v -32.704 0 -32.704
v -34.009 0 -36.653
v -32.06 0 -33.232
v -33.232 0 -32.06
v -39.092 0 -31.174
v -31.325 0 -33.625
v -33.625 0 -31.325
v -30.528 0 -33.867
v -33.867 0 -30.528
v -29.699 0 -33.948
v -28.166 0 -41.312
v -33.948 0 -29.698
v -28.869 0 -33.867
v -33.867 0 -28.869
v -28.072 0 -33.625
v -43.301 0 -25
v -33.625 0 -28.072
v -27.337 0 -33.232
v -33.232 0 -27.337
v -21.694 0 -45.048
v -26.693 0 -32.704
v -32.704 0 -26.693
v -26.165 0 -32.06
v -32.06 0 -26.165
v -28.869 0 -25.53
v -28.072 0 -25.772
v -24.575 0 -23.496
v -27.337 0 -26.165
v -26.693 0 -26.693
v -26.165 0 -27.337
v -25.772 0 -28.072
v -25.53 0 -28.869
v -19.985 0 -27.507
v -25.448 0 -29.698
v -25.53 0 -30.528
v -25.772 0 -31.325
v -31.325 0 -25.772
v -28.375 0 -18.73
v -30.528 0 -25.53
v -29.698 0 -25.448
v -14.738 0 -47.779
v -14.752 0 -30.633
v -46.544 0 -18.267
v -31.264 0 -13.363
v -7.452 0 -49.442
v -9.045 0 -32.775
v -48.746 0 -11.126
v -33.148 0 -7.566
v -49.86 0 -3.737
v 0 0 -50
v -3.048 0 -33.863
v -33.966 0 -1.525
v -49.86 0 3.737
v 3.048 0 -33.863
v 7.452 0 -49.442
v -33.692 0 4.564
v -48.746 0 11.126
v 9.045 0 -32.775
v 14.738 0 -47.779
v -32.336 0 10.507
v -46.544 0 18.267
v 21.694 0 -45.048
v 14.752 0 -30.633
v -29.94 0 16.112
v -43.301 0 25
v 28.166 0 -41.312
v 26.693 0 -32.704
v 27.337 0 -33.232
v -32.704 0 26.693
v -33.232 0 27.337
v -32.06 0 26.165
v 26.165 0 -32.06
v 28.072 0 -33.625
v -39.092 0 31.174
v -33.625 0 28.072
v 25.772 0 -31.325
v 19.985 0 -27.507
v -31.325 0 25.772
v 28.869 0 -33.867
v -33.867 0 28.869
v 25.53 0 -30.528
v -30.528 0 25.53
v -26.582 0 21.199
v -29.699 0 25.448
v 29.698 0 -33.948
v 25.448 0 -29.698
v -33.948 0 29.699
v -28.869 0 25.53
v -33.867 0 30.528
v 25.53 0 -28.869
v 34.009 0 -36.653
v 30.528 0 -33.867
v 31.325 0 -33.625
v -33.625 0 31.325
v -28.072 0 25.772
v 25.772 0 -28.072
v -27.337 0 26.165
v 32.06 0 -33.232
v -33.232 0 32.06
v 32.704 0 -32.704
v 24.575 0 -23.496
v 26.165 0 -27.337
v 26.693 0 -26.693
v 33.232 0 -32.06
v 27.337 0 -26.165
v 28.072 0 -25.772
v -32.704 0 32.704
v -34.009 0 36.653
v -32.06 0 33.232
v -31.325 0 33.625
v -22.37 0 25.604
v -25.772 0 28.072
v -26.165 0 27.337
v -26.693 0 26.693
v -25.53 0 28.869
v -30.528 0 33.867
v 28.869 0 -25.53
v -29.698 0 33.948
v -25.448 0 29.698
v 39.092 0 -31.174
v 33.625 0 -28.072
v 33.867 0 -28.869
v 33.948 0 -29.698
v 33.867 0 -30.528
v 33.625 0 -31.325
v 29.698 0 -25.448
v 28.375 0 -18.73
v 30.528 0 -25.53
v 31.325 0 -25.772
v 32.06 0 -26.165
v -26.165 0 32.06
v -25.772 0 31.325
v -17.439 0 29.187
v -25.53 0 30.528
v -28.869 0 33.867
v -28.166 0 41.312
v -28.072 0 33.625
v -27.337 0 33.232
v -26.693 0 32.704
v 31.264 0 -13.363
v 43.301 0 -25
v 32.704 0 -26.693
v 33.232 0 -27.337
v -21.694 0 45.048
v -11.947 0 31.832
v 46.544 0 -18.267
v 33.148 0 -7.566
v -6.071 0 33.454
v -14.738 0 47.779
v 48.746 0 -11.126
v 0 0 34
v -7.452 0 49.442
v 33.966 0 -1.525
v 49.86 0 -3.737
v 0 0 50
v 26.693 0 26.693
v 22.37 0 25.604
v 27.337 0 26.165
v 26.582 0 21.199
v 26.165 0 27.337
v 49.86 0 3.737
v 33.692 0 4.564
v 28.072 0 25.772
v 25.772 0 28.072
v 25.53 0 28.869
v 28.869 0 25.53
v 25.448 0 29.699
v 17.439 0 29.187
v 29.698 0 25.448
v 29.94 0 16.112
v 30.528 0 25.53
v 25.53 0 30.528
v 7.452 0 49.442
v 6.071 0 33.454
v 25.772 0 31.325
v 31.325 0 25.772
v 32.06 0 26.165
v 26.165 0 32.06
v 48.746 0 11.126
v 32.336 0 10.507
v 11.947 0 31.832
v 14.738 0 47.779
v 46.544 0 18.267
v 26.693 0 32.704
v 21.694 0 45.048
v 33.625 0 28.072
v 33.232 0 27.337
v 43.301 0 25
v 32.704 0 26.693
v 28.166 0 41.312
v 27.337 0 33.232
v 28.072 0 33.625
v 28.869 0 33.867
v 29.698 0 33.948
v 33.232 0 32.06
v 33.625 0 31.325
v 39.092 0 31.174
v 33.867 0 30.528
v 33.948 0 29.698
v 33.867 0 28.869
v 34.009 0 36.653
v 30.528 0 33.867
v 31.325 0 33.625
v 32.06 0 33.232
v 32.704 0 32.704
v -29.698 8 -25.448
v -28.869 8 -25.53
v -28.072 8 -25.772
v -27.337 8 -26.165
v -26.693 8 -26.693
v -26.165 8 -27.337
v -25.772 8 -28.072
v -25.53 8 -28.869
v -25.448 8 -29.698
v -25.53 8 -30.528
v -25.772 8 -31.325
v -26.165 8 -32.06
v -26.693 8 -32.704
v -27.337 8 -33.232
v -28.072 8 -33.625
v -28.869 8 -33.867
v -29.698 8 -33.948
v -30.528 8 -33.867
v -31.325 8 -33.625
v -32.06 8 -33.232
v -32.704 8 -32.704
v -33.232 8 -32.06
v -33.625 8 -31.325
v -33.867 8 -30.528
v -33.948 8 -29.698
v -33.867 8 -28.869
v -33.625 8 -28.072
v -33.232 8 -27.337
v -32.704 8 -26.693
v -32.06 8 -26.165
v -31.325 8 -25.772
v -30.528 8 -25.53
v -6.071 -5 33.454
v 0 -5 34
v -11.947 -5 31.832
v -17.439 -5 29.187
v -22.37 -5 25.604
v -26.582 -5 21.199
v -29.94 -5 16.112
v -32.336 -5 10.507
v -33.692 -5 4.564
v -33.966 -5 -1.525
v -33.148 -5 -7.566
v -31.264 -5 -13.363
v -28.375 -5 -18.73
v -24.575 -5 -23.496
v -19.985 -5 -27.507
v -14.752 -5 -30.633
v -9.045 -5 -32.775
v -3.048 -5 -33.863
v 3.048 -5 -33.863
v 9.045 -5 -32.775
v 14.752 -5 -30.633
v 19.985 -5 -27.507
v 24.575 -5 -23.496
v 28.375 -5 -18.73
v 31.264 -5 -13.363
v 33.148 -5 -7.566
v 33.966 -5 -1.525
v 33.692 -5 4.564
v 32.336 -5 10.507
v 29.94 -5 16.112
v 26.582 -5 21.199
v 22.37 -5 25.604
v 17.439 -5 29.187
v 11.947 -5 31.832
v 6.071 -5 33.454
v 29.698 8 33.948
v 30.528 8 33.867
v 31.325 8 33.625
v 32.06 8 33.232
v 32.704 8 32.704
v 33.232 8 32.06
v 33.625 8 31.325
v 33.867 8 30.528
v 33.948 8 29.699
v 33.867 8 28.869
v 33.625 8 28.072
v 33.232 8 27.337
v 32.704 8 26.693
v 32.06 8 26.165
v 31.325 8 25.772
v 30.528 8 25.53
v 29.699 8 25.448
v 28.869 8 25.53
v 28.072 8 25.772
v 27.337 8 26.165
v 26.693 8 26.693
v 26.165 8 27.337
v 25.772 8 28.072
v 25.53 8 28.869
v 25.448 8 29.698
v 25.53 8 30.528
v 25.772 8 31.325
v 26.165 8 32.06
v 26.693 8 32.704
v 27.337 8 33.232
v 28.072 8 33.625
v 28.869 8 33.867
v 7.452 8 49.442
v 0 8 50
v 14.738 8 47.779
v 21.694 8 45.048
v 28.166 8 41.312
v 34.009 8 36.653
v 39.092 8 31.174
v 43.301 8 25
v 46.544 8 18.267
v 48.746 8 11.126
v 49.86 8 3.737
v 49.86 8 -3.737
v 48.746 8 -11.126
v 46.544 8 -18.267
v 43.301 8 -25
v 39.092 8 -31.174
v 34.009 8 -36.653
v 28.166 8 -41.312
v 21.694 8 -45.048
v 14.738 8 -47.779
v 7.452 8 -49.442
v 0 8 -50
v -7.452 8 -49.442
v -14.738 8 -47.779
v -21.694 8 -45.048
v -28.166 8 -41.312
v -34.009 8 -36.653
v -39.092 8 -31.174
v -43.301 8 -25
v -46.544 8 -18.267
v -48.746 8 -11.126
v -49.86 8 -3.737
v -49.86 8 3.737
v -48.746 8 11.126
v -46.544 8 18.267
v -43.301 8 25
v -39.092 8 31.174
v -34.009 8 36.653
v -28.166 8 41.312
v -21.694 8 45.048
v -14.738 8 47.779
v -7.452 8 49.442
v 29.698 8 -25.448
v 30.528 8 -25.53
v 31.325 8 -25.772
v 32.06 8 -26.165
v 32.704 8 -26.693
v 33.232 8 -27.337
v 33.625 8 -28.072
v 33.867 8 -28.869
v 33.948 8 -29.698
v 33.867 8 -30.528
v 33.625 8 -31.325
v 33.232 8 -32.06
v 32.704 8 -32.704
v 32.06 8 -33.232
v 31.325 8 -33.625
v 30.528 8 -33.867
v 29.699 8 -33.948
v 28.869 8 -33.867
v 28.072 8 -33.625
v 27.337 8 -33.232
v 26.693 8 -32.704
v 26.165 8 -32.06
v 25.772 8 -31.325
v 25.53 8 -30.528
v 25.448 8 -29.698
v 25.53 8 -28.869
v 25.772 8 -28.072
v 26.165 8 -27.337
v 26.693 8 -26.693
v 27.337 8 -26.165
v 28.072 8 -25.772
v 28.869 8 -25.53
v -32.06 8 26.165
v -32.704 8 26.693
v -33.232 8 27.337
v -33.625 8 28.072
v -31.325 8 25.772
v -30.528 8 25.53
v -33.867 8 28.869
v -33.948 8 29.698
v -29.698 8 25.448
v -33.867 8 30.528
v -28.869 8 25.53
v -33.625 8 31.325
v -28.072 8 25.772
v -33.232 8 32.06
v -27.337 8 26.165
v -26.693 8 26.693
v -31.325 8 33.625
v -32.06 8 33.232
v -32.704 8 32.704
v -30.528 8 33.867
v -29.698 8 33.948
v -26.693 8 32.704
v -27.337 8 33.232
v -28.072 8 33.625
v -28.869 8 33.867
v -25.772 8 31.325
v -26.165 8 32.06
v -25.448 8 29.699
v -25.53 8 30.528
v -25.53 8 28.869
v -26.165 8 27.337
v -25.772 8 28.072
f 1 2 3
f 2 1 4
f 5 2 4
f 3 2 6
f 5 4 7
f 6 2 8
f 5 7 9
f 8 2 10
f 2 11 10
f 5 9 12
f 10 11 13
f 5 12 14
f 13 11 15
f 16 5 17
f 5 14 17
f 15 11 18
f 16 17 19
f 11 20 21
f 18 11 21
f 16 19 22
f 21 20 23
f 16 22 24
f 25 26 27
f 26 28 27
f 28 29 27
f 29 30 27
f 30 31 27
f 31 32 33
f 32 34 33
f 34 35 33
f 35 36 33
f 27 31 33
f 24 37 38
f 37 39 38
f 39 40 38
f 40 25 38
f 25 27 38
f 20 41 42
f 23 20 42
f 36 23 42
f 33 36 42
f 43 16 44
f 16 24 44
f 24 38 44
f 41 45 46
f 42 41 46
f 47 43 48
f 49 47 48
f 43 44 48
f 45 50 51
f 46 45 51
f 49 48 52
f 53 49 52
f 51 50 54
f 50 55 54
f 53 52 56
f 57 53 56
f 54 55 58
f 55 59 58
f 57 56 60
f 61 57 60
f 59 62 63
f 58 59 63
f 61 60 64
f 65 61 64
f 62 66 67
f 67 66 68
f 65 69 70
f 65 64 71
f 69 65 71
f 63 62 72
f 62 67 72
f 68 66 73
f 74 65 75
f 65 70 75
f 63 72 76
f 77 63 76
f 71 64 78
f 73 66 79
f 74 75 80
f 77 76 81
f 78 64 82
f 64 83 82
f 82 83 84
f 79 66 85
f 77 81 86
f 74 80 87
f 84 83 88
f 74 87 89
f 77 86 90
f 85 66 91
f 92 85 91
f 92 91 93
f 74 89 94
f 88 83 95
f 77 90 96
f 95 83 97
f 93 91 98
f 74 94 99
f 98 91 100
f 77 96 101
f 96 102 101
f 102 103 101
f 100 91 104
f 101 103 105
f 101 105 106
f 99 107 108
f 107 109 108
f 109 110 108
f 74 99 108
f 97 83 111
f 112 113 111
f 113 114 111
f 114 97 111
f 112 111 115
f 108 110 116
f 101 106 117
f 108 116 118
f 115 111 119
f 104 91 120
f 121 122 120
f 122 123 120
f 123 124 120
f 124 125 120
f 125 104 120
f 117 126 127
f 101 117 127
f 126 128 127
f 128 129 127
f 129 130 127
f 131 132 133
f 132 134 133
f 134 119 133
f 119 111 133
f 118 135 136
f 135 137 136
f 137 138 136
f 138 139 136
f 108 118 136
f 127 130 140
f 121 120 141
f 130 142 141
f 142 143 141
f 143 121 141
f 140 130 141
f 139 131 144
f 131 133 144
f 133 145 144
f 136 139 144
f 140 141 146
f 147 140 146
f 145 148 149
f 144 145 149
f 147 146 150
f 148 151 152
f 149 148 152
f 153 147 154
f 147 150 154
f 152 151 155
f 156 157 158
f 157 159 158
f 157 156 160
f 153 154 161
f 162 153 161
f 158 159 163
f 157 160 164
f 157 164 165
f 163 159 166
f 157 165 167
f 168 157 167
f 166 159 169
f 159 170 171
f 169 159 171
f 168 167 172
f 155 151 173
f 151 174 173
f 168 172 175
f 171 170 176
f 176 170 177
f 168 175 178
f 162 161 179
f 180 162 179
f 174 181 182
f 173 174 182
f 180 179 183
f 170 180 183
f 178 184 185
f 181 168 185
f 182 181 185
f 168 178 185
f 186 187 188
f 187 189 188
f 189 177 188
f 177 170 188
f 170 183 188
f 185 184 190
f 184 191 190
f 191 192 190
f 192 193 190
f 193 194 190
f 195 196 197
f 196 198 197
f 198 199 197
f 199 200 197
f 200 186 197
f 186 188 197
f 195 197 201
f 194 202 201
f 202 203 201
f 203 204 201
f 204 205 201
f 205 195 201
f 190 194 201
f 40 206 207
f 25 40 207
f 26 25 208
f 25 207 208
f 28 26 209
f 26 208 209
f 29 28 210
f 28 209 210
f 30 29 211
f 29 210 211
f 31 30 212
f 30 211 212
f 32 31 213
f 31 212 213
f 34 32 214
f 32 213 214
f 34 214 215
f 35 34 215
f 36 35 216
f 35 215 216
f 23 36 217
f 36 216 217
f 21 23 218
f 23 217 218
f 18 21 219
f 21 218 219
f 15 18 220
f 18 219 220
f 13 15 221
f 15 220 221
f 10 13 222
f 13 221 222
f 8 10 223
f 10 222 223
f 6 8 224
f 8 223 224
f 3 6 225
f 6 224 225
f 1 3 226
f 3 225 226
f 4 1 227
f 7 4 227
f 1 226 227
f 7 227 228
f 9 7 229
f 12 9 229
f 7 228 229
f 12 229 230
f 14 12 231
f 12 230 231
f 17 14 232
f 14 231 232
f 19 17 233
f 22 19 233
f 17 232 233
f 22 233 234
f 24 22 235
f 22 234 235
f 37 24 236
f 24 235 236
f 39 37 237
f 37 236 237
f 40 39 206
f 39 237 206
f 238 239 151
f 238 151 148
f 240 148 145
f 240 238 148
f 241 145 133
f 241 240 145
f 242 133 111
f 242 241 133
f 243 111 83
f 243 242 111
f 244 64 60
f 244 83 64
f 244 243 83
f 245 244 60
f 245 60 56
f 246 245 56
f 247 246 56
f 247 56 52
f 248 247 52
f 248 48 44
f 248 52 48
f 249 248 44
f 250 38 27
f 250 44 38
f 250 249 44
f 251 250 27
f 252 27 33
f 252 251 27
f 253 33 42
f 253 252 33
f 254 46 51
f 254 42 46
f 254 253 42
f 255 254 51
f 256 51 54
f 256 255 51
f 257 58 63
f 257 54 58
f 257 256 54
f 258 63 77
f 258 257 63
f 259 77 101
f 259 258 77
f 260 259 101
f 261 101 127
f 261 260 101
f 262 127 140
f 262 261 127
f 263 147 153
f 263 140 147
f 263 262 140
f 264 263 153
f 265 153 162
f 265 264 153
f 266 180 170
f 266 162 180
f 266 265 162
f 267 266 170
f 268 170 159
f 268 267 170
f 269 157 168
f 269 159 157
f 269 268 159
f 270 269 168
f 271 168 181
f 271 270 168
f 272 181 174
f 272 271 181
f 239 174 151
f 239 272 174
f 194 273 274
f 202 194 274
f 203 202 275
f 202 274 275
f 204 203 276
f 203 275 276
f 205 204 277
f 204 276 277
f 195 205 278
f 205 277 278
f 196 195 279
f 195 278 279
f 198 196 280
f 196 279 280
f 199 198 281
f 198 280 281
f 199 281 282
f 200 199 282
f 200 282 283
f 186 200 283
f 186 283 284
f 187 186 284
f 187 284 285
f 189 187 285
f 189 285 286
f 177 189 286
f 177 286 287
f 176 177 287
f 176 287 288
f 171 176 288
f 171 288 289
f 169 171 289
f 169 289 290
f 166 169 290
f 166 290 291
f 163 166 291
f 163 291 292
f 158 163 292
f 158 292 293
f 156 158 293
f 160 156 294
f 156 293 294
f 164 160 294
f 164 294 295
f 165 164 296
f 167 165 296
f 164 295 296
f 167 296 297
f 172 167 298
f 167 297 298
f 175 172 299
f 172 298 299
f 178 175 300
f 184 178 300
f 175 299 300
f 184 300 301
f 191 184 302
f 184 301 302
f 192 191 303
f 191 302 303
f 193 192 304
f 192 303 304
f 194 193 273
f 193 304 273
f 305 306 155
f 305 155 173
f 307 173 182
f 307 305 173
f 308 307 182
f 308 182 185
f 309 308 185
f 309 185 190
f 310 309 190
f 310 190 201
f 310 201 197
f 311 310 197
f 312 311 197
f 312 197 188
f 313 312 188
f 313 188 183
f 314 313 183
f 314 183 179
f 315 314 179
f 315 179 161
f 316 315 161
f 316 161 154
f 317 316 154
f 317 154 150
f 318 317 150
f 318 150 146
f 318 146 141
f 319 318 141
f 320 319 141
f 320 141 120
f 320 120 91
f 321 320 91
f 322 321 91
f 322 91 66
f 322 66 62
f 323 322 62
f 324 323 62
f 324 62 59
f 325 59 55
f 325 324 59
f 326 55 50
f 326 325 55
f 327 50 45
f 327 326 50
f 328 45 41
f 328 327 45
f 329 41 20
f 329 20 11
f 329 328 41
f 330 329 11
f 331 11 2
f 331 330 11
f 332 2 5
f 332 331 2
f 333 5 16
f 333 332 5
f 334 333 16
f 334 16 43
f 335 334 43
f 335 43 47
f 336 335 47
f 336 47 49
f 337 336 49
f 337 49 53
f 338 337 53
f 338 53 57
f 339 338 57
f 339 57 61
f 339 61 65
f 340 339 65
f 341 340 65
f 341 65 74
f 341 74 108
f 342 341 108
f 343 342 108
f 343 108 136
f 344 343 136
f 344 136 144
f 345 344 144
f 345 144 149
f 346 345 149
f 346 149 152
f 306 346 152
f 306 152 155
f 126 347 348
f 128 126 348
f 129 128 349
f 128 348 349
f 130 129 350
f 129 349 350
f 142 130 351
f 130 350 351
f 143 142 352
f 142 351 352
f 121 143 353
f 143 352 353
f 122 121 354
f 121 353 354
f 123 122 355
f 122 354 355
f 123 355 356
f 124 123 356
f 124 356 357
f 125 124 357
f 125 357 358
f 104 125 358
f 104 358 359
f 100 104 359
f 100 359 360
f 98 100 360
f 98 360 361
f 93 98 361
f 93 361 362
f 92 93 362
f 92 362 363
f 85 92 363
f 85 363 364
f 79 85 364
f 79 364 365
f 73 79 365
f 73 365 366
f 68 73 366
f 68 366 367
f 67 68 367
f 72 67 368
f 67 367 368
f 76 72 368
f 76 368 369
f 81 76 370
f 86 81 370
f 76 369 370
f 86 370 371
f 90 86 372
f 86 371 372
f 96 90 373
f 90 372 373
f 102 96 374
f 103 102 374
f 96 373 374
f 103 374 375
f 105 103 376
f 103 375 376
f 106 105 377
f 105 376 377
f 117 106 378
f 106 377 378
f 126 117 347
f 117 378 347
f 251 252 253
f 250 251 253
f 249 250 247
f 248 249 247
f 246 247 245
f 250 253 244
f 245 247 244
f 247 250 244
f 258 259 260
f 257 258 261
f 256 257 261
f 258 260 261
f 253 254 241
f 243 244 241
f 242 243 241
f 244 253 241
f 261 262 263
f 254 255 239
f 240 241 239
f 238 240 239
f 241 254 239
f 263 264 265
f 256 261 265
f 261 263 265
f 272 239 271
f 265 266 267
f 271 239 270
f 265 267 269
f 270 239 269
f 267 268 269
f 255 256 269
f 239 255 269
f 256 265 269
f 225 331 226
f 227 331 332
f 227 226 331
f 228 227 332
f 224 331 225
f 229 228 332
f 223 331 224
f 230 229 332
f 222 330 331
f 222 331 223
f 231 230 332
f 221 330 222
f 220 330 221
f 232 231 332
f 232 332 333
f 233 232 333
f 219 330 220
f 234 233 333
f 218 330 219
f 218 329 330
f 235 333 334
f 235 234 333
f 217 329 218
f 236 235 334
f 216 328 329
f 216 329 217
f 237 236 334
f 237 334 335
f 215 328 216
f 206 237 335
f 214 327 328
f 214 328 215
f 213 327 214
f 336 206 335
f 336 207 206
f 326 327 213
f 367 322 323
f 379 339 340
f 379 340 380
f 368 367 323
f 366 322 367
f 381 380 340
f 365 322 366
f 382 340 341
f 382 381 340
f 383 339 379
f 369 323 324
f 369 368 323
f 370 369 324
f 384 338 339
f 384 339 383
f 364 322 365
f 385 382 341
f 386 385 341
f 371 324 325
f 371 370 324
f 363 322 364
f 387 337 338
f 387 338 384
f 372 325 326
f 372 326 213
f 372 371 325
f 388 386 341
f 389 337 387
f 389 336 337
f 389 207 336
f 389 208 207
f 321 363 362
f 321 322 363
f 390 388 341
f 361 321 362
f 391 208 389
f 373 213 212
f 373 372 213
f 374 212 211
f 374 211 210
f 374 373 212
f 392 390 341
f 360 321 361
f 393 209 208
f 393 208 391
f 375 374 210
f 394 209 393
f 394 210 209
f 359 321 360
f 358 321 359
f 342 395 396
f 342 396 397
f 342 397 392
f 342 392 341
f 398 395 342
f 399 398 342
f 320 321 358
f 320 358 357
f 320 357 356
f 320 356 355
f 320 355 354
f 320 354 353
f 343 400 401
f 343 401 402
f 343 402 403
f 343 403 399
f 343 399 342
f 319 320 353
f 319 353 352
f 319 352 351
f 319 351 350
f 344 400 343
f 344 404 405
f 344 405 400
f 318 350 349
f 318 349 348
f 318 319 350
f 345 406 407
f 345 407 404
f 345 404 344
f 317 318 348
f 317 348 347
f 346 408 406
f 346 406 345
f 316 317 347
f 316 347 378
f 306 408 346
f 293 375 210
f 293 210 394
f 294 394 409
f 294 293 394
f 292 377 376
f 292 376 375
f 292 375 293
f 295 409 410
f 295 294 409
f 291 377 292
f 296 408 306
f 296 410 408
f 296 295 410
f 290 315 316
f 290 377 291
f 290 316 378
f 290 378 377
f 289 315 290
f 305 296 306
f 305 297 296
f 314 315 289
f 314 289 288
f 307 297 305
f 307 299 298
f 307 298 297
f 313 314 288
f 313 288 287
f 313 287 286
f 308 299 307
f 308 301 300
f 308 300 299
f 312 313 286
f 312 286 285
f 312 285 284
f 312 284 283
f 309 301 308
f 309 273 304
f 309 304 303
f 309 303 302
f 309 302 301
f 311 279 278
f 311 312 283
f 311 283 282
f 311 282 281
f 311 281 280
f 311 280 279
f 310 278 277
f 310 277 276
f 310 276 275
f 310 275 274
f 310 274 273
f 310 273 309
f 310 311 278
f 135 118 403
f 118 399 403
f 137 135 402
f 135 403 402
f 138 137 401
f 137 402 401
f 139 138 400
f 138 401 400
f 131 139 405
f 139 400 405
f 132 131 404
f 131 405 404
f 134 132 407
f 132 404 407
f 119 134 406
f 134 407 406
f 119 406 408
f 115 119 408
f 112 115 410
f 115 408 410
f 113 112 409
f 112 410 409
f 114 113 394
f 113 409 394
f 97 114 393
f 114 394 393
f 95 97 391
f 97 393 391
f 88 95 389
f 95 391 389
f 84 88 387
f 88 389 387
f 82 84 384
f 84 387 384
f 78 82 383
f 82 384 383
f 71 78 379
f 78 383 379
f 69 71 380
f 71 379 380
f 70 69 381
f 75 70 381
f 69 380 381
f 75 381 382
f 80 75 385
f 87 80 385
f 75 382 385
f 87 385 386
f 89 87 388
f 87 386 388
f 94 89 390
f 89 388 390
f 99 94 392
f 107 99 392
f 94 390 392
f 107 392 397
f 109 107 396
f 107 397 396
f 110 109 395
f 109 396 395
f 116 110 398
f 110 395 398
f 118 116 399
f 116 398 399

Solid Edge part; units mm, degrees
sketch "Sketch1" plane through (0, 0, 0) normal (1, 0, 0) x (0, 1, 0)
  line L0 (0, 50) -> (0, 34)
  line L1 (0, 34) -> (-5, 34)
  line L2 (-5, 34) -> (-5, 0)
  line L3 (-5, 0) -> (4, 0)
  line L4 (8, 0) -> (4, 0)
  line L5 (8, 34) -> (8, 0)
  line L6 (8, 34) -> (8, 50)
  line L7 (0, 50) -> (8, 50)
revolve "RevolvedProtrusion1" add sketch "Sketch1" angle 360 about axis through (0, -22.1591, 0) along (0, 1, 0)
revolve "RevolvedProtrusion2" [suppressed]
hole "Hole1" at (29.6985, 8, -29.6985) direction (0, -1, 0) diameter 8.5 end through all
hole "Hole2" at (-29.6985, 8, -29.6985) direction (0, -1, 0) diameter 8.5 end through all
hole "Hole3" at (29.6985, 8, 29.6985) direction (0, -1, 0) diameter 8.5 end through all
hole "Hole4" at (-29.6985, 8, 29.6985) direction (0, -1, 0) diameter 8.5 end through all
